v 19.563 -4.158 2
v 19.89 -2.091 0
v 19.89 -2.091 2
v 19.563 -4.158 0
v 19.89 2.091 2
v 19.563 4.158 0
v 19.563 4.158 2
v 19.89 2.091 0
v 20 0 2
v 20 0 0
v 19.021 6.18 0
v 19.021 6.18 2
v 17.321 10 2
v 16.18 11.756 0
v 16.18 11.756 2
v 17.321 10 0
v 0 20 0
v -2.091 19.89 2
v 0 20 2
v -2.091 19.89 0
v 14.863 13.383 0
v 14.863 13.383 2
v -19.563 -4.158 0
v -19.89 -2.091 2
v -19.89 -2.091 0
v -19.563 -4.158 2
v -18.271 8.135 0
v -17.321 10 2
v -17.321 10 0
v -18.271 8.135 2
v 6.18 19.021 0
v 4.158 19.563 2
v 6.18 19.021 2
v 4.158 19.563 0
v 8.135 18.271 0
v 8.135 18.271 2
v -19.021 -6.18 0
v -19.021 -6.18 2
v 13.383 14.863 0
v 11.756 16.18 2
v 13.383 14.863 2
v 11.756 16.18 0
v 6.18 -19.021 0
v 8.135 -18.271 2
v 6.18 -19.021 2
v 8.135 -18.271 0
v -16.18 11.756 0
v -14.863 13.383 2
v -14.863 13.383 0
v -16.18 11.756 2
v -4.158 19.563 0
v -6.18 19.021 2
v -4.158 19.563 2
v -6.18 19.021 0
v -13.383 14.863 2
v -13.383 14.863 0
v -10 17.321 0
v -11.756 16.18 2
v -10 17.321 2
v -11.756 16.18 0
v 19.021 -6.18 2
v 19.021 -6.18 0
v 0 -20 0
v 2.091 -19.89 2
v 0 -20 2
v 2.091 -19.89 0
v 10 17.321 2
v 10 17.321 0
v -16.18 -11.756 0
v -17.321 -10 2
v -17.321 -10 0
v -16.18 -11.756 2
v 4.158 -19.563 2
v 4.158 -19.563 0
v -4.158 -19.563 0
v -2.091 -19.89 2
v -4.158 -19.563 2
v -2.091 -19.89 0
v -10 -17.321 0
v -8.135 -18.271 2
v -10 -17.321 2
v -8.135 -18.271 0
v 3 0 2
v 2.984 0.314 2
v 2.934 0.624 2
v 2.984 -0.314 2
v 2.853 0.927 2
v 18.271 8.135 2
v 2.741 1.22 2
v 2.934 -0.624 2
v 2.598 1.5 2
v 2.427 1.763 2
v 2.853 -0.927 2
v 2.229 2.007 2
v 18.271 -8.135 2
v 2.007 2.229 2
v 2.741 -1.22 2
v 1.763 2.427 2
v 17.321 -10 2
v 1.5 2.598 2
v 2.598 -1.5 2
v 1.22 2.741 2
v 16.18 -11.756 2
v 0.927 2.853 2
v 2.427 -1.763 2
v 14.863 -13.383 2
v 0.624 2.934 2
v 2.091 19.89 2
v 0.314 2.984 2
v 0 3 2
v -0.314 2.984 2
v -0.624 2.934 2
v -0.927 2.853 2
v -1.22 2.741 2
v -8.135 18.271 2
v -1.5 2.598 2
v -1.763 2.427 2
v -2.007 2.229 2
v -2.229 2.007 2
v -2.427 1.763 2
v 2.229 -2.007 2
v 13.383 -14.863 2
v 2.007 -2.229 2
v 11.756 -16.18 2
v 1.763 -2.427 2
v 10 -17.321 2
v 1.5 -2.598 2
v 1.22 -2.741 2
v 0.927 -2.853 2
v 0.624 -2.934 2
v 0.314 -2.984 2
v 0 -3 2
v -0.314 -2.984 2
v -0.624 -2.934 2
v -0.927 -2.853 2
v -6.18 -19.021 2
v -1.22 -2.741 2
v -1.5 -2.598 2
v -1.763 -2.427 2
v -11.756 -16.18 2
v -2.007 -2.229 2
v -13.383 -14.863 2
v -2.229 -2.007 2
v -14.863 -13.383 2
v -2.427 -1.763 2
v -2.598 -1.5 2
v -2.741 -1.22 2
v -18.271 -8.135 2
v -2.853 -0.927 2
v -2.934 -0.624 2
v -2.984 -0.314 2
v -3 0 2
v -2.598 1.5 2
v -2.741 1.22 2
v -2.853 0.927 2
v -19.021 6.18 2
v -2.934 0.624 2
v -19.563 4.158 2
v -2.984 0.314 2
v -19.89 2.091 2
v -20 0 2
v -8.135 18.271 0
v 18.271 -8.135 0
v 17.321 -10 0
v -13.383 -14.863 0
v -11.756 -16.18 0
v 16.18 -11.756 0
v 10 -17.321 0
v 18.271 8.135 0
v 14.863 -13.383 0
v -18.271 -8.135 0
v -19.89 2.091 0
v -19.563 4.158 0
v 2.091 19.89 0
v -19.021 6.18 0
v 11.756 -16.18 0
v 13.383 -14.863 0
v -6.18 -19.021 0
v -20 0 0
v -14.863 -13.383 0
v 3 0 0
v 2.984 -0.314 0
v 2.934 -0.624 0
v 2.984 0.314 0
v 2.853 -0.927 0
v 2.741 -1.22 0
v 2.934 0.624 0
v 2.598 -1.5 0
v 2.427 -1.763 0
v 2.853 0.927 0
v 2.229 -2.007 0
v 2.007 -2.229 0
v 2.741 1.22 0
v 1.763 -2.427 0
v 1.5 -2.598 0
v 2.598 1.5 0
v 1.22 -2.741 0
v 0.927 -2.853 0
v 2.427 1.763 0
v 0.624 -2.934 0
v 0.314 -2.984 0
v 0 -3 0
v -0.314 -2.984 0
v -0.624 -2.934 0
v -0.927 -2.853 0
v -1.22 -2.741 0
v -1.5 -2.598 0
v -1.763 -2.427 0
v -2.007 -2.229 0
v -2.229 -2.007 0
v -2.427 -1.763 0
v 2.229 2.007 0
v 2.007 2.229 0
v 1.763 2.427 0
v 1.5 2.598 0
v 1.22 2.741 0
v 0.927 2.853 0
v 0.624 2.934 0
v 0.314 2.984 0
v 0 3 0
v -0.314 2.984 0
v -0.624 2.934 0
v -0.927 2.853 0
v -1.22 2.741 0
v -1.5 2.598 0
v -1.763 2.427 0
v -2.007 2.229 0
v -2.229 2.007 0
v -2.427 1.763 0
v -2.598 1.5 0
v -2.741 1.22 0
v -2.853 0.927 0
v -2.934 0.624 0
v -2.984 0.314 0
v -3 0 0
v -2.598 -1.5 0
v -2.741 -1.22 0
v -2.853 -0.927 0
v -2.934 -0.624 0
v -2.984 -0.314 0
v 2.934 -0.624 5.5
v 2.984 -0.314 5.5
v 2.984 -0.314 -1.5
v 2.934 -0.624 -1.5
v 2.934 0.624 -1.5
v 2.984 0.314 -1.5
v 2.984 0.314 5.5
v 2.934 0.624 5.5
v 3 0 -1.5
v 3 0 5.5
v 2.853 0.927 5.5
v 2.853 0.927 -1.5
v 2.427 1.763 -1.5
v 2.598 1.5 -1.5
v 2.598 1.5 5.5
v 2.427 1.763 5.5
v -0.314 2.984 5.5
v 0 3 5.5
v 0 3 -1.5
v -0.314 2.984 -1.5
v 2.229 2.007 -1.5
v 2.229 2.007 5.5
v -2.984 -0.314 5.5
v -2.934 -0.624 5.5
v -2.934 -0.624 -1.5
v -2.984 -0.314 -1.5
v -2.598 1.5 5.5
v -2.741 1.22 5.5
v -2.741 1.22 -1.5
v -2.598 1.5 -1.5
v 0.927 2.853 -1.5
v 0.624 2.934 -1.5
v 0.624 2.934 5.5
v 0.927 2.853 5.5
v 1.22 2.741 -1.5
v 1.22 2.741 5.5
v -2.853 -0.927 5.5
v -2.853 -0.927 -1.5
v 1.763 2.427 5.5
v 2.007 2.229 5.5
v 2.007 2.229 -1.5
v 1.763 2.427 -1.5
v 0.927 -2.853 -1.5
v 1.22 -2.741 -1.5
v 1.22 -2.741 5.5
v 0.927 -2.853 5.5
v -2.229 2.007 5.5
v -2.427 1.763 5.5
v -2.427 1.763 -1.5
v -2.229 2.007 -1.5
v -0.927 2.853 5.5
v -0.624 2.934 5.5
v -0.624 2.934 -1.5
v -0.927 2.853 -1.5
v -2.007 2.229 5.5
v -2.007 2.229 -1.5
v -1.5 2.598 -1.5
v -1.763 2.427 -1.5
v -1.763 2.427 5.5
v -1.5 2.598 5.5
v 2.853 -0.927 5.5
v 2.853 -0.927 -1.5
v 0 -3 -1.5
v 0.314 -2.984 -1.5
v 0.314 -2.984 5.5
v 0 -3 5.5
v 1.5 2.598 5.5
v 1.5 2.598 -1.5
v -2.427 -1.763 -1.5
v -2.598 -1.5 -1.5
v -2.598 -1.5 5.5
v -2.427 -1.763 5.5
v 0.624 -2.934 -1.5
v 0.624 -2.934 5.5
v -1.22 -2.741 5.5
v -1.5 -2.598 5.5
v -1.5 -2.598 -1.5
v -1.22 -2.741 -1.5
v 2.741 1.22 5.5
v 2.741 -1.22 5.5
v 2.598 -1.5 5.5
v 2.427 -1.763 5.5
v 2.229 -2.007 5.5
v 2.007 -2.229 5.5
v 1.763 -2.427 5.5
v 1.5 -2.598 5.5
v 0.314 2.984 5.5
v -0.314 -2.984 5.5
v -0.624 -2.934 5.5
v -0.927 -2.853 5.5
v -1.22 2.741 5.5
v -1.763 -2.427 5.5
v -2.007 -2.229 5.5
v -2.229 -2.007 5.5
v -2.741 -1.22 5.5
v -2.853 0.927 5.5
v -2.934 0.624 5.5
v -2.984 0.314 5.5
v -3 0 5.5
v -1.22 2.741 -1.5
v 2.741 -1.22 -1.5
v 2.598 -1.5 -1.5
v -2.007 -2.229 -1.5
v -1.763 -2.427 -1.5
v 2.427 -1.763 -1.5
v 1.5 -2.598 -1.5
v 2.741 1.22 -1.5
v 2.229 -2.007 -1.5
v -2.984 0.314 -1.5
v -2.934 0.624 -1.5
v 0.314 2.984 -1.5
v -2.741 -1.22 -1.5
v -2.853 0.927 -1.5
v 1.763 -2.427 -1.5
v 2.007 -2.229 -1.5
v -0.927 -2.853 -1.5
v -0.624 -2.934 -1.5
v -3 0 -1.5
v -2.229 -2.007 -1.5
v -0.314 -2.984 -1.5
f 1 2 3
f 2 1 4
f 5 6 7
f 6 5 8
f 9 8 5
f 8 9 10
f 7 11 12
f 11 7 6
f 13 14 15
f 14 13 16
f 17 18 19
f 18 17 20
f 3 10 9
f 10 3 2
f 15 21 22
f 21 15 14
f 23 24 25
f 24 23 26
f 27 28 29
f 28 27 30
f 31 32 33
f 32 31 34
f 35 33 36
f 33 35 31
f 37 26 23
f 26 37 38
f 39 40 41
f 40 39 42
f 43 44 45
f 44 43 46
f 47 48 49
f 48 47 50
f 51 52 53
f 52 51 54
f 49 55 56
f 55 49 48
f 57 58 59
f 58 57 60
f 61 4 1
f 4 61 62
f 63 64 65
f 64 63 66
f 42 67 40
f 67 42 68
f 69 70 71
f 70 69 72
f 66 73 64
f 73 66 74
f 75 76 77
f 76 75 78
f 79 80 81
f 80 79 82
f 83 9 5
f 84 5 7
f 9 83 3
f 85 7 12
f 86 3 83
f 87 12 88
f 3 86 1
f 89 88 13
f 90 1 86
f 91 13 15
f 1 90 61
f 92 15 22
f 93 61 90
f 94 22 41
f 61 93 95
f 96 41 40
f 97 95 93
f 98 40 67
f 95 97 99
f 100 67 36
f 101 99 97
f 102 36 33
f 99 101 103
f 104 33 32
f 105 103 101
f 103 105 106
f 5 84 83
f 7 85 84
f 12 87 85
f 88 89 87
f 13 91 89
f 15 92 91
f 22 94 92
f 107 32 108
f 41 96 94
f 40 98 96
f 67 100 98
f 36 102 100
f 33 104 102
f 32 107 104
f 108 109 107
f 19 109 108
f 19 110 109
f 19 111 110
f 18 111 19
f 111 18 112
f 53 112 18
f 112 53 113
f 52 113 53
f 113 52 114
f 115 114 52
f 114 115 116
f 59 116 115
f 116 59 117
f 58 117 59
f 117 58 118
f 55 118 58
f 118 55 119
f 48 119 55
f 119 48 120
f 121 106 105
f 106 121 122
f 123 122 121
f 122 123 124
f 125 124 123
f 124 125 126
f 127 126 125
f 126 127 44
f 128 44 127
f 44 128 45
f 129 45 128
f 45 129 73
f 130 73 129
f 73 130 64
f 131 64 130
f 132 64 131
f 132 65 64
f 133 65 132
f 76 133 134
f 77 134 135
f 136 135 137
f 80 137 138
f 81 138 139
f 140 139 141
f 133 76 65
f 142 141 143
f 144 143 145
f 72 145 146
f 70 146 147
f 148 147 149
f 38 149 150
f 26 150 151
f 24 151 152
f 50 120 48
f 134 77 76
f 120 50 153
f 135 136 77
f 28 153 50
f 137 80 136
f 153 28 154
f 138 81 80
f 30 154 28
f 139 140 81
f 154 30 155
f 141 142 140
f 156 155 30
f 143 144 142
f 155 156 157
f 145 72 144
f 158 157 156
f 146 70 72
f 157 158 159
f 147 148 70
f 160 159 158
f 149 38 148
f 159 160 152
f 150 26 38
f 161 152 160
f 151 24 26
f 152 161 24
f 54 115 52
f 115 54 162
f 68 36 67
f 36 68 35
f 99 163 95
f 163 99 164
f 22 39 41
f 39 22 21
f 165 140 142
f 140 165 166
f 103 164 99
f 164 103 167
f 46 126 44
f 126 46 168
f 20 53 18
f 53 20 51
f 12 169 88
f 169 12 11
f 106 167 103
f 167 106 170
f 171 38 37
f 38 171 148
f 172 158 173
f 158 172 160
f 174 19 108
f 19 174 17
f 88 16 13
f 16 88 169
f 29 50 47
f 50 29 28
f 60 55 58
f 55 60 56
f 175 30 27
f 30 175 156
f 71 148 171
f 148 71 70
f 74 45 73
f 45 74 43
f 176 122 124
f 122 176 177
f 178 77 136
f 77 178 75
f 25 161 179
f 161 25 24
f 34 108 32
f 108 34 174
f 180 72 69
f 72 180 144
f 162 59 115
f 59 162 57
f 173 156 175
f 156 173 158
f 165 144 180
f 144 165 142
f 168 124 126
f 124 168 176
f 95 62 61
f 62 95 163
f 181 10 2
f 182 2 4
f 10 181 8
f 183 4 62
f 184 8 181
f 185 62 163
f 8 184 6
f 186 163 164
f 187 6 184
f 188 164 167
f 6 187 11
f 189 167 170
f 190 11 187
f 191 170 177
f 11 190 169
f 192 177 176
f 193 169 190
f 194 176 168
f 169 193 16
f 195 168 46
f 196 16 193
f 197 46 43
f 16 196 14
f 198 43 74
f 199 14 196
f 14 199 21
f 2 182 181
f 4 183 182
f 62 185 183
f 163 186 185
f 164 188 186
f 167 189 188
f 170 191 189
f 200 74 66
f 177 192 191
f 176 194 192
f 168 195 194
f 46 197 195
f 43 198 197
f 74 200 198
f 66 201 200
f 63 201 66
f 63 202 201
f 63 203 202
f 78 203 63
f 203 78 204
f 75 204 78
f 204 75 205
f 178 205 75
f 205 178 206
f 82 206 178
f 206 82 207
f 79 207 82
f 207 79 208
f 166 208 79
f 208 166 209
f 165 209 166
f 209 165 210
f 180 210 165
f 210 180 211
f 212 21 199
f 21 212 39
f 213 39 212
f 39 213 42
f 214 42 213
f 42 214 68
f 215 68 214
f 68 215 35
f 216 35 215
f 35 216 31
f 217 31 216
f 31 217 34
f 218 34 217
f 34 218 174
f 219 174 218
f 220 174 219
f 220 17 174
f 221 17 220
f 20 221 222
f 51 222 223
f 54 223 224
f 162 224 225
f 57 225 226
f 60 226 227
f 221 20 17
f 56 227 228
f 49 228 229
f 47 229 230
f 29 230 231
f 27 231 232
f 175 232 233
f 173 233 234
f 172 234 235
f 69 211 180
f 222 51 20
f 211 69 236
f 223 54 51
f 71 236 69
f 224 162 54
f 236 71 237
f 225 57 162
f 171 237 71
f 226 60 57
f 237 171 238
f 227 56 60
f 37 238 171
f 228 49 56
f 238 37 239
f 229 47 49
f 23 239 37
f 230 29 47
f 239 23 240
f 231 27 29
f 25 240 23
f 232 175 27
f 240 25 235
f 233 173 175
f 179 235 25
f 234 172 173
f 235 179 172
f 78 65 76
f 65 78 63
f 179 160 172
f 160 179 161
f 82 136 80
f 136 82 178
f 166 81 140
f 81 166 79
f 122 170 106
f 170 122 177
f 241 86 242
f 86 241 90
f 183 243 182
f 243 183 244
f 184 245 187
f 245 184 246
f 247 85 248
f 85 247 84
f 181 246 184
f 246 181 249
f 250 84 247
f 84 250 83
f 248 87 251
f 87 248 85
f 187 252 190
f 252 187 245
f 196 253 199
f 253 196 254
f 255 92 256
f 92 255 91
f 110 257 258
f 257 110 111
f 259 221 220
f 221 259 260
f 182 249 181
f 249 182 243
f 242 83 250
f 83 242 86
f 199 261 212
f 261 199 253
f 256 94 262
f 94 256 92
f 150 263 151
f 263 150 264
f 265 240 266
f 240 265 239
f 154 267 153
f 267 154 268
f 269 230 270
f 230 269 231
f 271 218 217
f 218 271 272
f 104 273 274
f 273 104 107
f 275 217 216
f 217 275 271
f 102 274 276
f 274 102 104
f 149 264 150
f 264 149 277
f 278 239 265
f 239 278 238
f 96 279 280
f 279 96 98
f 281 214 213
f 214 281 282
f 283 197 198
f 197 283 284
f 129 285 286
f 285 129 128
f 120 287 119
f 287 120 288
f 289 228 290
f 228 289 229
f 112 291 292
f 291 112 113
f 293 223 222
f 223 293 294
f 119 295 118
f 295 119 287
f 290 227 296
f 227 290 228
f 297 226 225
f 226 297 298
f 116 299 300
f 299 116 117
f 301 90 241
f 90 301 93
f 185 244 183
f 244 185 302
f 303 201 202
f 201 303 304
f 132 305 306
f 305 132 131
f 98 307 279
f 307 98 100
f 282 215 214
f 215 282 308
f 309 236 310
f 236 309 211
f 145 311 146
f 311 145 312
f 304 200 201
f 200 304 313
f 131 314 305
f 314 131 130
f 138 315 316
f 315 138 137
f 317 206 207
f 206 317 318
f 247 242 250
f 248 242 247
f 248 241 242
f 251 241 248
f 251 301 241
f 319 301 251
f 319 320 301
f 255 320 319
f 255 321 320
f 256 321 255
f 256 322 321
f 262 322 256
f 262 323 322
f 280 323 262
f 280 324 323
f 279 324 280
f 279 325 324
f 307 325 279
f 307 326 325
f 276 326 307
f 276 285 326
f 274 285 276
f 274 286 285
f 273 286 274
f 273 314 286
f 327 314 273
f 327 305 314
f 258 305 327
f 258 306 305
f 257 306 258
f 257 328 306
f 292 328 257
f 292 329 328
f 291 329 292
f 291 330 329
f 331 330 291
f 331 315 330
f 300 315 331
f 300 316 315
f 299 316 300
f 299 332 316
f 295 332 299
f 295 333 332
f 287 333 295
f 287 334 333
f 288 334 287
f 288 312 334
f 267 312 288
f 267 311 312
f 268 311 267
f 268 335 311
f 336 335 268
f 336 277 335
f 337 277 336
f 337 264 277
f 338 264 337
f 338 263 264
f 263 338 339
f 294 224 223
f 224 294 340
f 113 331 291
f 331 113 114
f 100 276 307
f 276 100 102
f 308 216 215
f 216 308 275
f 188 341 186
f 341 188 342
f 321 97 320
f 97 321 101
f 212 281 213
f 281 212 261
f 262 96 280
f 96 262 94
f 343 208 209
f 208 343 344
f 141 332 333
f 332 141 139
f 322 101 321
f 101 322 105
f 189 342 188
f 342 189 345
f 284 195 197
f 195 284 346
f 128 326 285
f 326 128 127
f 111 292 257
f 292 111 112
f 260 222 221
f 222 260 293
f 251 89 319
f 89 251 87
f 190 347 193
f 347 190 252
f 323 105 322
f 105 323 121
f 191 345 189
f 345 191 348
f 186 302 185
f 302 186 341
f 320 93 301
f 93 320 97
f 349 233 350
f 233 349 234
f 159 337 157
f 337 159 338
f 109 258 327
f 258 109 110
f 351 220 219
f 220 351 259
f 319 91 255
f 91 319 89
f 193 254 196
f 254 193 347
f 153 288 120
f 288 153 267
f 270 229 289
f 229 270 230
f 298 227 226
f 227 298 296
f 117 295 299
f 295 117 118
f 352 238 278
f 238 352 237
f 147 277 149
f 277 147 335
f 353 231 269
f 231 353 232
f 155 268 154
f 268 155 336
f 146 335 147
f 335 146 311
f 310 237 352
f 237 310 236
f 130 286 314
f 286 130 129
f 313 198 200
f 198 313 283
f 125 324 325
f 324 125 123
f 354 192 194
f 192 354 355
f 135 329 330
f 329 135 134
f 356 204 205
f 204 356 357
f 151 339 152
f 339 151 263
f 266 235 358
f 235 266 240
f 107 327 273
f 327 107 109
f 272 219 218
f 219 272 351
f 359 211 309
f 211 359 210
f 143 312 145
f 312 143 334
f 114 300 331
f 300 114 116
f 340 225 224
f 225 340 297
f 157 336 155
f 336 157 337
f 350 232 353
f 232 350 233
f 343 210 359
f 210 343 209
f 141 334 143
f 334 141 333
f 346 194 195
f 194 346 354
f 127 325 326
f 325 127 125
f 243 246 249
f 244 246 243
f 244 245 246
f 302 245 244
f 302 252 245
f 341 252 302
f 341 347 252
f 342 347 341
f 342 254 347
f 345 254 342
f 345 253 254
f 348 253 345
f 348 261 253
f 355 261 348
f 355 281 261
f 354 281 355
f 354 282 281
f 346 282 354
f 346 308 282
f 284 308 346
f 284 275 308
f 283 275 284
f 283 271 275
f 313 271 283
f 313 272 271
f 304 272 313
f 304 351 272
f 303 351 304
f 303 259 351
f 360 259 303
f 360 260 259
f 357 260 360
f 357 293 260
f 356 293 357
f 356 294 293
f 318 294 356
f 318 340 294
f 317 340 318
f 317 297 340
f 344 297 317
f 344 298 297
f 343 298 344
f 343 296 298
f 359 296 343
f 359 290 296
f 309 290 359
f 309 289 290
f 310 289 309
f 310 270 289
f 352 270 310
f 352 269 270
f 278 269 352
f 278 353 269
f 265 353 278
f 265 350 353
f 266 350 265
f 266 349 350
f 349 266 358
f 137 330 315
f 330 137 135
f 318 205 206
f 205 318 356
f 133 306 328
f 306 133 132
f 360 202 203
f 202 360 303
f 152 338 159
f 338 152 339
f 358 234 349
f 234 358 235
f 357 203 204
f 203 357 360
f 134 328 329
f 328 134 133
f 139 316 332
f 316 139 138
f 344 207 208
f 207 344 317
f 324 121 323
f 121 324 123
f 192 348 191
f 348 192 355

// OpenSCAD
// promień części przyklejanej
radius1 = 20;
// wysokość części przyklejanej
height1 = 2;

translate([0, 0, height1/2])
    cylinder(h = height1, r1 = radius1, r2 = radius1, center = true, $fn=60);

translate([0,0, height1])
cylinder(h = 7, r1 = 3, r2 = 3, center = true, $fn=60);
